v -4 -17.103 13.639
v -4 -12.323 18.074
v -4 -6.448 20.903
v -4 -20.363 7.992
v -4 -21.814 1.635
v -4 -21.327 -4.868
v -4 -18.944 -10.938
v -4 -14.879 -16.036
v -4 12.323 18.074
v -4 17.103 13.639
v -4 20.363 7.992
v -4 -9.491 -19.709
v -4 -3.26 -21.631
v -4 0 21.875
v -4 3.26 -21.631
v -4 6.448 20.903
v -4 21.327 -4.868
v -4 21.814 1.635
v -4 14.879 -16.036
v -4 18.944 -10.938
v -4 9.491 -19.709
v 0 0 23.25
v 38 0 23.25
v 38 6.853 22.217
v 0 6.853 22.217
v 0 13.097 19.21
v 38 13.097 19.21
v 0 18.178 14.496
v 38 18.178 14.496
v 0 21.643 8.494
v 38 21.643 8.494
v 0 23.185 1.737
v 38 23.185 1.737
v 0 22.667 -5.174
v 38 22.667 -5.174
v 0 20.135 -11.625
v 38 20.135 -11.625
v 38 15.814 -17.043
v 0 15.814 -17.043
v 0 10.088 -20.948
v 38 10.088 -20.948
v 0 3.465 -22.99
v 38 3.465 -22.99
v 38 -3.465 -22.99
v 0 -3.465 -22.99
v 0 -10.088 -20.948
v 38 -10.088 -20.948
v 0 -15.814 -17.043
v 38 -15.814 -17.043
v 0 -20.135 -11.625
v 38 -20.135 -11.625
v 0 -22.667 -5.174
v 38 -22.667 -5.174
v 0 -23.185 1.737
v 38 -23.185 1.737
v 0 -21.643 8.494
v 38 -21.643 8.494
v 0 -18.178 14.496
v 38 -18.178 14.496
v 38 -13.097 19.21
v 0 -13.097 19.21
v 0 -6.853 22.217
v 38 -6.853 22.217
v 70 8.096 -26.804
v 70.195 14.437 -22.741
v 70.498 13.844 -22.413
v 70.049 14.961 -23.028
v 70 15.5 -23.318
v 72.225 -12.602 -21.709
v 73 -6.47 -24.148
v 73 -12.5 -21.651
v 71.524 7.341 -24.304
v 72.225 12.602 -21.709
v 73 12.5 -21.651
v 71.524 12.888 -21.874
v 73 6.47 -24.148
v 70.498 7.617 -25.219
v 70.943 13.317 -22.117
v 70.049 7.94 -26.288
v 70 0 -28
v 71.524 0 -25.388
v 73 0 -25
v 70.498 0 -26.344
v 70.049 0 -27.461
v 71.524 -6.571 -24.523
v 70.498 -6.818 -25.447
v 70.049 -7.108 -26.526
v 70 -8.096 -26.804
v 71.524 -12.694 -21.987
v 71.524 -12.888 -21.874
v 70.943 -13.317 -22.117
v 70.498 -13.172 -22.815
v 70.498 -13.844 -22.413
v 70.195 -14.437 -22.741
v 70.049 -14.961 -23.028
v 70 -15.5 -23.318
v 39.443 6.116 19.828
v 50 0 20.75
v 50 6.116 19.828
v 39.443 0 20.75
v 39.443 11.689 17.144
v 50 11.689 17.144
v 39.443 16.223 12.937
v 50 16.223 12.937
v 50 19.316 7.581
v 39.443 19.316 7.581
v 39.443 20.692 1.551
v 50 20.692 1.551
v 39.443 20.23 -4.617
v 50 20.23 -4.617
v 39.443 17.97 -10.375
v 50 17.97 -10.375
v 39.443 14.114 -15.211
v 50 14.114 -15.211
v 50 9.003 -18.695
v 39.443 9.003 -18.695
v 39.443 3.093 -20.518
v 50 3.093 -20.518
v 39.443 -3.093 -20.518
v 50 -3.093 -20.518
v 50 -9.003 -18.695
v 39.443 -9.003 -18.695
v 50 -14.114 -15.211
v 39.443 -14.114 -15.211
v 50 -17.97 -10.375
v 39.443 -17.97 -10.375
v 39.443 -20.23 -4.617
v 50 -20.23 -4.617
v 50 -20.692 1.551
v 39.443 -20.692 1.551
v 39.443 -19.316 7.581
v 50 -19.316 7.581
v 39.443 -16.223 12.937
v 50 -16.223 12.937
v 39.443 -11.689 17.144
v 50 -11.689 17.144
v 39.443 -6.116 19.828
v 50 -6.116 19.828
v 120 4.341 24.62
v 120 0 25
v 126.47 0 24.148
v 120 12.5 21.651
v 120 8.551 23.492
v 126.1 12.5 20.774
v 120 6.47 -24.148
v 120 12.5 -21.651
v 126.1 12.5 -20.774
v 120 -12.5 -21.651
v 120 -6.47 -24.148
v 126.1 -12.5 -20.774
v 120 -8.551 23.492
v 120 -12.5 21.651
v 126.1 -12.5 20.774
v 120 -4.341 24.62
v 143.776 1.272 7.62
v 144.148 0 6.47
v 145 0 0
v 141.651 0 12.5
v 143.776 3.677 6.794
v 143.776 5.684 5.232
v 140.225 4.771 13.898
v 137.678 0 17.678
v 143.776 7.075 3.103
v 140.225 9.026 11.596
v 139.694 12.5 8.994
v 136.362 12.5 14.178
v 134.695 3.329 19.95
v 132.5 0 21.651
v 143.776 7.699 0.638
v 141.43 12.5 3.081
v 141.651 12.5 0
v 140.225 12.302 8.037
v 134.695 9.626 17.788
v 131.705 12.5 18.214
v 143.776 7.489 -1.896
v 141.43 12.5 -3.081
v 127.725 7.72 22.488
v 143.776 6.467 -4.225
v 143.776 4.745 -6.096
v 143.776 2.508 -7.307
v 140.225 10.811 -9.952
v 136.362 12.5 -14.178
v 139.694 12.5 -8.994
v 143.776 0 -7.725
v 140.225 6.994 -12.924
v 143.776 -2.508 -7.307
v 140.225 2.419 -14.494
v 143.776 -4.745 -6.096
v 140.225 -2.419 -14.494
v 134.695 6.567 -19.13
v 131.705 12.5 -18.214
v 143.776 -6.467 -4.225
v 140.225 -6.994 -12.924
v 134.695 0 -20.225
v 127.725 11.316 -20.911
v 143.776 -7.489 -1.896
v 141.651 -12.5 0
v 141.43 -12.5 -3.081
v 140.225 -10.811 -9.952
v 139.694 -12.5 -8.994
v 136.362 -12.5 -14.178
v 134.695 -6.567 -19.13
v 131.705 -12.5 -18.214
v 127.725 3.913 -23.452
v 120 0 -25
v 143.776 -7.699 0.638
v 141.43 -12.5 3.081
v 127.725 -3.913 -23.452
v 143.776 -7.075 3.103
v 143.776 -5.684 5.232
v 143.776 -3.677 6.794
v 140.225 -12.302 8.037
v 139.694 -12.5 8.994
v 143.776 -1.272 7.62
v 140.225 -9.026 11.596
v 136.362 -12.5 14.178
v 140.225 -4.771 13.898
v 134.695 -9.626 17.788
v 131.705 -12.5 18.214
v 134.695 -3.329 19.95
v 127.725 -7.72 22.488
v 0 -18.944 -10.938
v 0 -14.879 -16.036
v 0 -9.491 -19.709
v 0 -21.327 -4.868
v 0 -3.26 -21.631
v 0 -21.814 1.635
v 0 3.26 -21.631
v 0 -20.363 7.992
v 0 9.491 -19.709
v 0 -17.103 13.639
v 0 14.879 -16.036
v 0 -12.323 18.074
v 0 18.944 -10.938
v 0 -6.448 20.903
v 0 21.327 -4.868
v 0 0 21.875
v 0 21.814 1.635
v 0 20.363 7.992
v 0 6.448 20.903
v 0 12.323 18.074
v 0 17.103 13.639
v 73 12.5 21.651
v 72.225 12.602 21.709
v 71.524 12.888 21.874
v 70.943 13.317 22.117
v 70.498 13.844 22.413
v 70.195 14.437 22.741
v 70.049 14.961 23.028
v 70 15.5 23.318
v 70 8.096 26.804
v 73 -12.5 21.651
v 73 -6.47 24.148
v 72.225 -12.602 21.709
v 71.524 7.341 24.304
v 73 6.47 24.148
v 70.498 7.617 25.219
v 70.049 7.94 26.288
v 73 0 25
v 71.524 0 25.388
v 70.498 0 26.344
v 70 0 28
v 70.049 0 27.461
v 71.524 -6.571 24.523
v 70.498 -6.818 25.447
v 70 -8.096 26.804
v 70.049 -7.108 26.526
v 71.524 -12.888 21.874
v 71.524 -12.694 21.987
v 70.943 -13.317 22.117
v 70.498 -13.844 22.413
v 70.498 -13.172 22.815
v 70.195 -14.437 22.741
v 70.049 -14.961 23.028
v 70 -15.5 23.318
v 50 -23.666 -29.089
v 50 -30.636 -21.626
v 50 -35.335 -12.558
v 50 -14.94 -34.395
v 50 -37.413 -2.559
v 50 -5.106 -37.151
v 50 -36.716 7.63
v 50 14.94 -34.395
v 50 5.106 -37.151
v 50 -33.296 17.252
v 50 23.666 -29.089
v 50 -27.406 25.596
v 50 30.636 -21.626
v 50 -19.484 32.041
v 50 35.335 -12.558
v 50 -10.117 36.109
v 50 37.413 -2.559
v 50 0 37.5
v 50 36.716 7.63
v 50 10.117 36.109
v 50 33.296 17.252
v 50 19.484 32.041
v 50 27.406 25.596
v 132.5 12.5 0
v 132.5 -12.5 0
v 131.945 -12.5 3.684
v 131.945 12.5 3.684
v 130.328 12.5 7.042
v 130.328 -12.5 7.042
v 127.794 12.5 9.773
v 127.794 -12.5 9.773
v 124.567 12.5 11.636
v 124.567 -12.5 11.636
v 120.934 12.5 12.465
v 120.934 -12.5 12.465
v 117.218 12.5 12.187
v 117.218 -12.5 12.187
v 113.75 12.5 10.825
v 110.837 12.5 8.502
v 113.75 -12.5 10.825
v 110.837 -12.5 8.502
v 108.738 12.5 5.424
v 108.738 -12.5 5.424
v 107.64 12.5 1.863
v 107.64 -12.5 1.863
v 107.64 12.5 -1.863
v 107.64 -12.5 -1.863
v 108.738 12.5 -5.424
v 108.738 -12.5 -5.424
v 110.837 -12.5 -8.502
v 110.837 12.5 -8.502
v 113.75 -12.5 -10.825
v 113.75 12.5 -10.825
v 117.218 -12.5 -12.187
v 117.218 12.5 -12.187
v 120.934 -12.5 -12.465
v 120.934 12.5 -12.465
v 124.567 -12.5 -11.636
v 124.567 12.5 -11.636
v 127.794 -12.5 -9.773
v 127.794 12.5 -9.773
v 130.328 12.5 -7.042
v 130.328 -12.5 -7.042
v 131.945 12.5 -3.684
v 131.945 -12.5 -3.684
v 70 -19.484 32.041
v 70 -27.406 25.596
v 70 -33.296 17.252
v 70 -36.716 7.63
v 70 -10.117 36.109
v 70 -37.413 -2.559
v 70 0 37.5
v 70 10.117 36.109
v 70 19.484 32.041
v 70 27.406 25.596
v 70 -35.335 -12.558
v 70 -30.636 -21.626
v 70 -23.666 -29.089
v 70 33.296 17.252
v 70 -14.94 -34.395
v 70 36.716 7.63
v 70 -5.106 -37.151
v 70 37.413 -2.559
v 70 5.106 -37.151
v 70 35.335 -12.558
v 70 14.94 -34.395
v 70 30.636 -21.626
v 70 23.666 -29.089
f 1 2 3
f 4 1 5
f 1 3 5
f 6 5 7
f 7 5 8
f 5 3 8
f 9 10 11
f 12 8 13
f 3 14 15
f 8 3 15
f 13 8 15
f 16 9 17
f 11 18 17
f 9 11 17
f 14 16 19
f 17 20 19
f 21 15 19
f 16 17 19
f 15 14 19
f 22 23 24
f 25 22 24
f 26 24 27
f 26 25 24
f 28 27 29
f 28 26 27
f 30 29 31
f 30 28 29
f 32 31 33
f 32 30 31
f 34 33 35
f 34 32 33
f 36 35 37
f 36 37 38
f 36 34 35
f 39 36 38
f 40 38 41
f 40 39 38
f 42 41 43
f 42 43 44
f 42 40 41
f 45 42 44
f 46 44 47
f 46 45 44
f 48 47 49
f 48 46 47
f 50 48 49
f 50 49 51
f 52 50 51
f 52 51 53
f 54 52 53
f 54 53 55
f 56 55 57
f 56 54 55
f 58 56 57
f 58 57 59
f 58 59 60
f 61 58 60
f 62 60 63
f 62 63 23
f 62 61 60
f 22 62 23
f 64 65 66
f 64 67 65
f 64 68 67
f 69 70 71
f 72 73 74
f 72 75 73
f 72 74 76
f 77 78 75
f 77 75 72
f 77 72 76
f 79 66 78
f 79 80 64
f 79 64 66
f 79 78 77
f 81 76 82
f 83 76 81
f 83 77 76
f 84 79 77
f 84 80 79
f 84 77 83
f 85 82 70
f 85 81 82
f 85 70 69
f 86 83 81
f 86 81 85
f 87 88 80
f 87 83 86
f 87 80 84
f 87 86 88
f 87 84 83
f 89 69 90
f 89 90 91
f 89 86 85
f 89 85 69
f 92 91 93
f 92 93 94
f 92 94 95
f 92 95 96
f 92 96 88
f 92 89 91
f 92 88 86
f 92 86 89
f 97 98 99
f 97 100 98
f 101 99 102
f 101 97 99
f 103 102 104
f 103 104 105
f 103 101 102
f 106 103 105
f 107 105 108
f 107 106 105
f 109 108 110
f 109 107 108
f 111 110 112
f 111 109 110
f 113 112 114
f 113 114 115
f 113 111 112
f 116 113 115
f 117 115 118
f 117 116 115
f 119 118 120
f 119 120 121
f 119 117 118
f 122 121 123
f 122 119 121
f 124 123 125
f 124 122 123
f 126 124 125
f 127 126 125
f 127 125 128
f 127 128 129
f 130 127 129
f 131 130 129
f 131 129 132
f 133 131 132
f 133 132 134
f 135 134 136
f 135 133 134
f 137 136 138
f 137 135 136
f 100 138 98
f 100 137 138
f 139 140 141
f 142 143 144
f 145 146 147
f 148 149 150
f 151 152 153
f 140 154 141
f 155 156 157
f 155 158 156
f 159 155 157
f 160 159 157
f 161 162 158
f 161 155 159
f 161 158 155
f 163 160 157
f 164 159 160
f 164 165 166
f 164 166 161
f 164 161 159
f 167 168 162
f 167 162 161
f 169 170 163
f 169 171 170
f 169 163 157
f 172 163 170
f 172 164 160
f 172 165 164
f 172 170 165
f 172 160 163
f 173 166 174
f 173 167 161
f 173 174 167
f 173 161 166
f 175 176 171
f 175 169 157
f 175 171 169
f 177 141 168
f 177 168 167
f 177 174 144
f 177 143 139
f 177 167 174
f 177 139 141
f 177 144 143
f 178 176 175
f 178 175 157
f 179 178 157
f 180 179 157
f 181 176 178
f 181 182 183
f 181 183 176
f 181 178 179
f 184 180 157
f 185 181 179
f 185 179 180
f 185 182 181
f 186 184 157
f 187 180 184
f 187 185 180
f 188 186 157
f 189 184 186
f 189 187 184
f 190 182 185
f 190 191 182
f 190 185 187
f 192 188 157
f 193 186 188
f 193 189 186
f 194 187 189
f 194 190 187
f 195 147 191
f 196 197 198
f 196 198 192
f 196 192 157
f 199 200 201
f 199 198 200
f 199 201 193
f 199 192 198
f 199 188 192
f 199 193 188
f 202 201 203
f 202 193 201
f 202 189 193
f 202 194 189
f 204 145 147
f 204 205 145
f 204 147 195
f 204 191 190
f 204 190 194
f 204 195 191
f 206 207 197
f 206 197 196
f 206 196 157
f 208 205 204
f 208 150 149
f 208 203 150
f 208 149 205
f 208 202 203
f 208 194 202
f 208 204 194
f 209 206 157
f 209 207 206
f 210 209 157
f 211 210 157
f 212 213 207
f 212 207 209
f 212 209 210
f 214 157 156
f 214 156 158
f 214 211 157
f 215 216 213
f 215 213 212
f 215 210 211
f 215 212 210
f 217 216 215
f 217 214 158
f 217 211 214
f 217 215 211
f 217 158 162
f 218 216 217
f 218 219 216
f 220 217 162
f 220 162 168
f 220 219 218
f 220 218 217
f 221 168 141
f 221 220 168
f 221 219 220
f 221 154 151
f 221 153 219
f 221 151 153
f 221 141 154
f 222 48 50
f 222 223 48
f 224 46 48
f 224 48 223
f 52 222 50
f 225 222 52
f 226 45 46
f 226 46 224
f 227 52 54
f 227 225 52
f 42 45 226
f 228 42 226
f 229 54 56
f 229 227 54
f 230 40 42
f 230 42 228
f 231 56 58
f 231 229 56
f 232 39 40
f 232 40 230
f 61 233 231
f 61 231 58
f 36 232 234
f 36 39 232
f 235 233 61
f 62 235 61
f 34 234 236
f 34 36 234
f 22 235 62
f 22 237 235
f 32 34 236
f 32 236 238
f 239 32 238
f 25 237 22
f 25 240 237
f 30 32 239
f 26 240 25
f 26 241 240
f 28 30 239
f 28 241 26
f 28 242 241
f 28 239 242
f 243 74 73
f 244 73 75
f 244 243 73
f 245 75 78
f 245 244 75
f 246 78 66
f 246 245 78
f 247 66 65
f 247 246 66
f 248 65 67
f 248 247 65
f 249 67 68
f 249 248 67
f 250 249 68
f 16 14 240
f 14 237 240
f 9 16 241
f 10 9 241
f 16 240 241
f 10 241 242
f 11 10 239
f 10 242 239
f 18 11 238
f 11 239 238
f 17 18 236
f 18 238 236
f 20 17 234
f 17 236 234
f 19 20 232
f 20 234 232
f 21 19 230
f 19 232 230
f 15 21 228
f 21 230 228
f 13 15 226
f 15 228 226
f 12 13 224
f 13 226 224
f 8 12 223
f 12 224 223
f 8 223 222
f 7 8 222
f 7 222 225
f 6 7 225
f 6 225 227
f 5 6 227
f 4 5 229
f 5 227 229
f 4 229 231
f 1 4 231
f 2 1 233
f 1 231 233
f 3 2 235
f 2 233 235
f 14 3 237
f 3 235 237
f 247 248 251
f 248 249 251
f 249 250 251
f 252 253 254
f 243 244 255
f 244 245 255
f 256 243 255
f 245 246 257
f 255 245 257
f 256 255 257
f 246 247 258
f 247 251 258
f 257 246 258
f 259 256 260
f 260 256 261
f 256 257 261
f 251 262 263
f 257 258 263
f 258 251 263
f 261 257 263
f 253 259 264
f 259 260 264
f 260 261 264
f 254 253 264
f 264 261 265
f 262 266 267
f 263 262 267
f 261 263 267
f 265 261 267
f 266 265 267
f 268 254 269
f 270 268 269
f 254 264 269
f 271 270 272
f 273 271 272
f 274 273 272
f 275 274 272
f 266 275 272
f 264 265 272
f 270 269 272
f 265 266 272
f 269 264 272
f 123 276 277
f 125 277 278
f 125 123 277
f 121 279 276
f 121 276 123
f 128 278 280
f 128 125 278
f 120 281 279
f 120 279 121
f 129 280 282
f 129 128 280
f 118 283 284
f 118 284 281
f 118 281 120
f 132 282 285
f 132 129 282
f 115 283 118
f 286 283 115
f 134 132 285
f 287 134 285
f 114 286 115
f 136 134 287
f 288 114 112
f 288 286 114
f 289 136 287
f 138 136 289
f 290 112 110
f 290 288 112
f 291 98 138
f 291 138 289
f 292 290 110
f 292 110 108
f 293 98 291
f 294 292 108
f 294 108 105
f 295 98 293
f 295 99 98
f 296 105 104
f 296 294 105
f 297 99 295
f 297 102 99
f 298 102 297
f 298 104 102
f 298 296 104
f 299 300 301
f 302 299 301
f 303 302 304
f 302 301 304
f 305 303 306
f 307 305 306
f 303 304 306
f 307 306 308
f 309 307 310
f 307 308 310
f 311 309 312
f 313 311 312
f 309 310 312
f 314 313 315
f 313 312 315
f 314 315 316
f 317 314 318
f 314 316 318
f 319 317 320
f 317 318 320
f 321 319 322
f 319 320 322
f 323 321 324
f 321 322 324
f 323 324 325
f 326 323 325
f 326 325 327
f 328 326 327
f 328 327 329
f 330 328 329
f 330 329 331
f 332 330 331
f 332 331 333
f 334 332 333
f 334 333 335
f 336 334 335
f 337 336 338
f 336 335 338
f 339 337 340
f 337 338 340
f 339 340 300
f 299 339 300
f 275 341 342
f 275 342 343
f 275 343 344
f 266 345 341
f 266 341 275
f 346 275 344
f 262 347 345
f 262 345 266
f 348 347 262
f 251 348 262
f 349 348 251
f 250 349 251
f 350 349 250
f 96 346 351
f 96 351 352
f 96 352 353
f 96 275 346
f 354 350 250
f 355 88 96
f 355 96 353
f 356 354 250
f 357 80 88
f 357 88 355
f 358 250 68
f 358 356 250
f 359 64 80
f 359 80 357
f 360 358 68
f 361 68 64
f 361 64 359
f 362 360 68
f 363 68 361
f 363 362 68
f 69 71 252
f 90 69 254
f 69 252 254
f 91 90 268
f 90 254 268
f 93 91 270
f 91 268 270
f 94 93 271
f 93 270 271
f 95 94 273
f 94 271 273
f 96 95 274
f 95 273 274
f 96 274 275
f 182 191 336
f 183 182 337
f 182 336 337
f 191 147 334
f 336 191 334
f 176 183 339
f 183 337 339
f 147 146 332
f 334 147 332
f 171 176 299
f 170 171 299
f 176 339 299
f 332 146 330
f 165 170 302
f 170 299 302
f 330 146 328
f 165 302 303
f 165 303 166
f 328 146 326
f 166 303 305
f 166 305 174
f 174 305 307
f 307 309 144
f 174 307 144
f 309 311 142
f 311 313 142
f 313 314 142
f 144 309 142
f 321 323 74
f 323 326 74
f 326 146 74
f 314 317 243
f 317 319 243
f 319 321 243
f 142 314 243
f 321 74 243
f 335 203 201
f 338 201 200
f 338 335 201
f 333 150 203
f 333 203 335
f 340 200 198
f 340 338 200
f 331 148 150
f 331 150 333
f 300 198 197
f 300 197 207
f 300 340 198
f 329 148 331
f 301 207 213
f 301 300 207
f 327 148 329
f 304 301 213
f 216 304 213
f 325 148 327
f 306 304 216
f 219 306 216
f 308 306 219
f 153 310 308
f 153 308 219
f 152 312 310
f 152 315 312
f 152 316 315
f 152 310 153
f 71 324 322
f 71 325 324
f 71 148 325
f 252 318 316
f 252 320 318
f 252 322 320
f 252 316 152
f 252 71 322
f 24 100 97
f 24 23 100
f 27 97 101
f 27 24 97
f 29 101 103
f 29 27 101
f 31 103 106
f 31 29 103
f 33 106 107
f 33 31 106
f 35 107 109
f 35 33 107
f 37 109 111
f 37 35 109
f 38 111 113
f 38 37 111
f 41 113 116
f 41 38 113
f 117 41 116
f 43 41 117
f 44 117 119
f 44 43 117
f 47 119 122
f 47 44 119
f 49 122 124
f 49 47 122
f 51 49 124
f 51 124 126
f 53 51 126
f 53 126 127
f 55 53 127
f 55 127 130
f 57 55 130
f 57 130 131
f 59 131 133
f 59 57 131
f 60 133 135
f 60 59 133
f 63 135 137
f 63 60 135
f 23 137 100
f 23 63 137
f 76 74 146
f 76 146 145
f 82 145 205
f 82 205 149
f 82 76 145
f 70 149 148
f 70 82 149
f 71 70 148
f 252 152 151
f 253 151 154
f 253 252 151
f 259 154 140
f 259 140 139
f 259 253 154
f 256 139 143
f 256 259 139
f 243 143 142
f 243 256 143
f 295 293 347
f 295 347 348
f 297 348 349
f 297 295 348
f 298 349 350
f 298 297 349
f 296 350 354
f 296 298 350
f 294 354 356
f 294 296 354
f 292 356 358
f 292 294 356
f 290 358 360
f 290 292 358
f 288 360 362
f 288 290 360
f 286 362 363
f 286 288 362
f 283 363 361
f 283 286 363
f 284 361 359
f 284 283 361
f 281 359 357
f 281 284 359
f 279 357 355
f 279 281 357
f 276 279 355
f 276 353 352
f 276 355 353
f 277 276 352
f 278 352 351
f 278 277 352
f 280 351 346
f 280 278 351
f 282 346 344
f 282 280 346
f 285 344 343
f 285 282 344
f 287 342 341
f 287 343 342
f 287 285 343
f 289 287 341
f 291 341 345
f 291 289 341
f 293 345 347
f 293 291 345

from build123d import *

# Parameters (mm, degrees)
F1_W     = 4
F1_H     = 21.875
F3_W     = 25
F3_H     = 43.3012701892
F4_DEPTH = 75
F5_R     = 12.5
F6_DEPTH = 25
F7_R     = 3


# Not quite as in the source:
# - a feature names something its author has since deleted; it is built from what else it names


with BuildPart() as f2:
    # F1 (on Front) → F2 (revolve)
    with BuildSketch(Plane.XZ):
        with BuildLine():
            Line((0, 21.875), (0, 0))
            Line((0, 0), (145, 0))
            ThreePointArc((145, 0), (137.6776695297, 17.6776695297), (120, 25))
            Line((120, 25), (70, 25))
            Line((70, 25), (70, 37.5))
            Line((70, 37.5), (50, 37.5))
            Line((50, 37.5), (50, 20.75))
            Line((50, 20.75), (39.443375673, 20.75))
            Line((39.443375673, 20.75), (38, 20.75))
            Line((38, 20.75), (38, 23.25))
            Line((38, 23.25), (0, 23.25))
            Line((0, 23.25), (0, 21.875))
        make_face()
        Polygon((39.443375673, 20.75), (38, 23.25), (38, 20.75), align=None)
        with Locations((-2, 10.9375)):
            Rectangle(F1_W, F1_H)
    revolve(axis=Axis((72.5, 0, 0), (-1, 0, 0)))

    # F3 (on face) → F4 (cut)
    with BuildSketch(Plane.YZ.offset(70)):
        with Locations((-25, 0)):
            Rectangle(F3_W, F3_H)
        with Locations((25, 0)):
            Rectangle(F3_W, F3_H)
    extrude(amount=F4_DEPTH, mode=Mode.SUBTRACT)

    # F5 (on face) → F6 (cut, through all)
    with BuildSketch(Plane.XZ.offset(12.5)):
        with Locations((120, 0)):
            Circle(F5_R)
    extrude(amount=-F6_DEPTH, mode=Mode.SUBTRACT)

    # F7
    f7_edges = [f2.edges().sort_by_distance(p)[0] for p in [
        (70, -12.5, 0),
        (70, 12.5, 0),
        (70, 0, 25),
        (70, 0, -25),
    ]]
    fillet(f7_edges, radius=F7_R)


solid = f2.part
